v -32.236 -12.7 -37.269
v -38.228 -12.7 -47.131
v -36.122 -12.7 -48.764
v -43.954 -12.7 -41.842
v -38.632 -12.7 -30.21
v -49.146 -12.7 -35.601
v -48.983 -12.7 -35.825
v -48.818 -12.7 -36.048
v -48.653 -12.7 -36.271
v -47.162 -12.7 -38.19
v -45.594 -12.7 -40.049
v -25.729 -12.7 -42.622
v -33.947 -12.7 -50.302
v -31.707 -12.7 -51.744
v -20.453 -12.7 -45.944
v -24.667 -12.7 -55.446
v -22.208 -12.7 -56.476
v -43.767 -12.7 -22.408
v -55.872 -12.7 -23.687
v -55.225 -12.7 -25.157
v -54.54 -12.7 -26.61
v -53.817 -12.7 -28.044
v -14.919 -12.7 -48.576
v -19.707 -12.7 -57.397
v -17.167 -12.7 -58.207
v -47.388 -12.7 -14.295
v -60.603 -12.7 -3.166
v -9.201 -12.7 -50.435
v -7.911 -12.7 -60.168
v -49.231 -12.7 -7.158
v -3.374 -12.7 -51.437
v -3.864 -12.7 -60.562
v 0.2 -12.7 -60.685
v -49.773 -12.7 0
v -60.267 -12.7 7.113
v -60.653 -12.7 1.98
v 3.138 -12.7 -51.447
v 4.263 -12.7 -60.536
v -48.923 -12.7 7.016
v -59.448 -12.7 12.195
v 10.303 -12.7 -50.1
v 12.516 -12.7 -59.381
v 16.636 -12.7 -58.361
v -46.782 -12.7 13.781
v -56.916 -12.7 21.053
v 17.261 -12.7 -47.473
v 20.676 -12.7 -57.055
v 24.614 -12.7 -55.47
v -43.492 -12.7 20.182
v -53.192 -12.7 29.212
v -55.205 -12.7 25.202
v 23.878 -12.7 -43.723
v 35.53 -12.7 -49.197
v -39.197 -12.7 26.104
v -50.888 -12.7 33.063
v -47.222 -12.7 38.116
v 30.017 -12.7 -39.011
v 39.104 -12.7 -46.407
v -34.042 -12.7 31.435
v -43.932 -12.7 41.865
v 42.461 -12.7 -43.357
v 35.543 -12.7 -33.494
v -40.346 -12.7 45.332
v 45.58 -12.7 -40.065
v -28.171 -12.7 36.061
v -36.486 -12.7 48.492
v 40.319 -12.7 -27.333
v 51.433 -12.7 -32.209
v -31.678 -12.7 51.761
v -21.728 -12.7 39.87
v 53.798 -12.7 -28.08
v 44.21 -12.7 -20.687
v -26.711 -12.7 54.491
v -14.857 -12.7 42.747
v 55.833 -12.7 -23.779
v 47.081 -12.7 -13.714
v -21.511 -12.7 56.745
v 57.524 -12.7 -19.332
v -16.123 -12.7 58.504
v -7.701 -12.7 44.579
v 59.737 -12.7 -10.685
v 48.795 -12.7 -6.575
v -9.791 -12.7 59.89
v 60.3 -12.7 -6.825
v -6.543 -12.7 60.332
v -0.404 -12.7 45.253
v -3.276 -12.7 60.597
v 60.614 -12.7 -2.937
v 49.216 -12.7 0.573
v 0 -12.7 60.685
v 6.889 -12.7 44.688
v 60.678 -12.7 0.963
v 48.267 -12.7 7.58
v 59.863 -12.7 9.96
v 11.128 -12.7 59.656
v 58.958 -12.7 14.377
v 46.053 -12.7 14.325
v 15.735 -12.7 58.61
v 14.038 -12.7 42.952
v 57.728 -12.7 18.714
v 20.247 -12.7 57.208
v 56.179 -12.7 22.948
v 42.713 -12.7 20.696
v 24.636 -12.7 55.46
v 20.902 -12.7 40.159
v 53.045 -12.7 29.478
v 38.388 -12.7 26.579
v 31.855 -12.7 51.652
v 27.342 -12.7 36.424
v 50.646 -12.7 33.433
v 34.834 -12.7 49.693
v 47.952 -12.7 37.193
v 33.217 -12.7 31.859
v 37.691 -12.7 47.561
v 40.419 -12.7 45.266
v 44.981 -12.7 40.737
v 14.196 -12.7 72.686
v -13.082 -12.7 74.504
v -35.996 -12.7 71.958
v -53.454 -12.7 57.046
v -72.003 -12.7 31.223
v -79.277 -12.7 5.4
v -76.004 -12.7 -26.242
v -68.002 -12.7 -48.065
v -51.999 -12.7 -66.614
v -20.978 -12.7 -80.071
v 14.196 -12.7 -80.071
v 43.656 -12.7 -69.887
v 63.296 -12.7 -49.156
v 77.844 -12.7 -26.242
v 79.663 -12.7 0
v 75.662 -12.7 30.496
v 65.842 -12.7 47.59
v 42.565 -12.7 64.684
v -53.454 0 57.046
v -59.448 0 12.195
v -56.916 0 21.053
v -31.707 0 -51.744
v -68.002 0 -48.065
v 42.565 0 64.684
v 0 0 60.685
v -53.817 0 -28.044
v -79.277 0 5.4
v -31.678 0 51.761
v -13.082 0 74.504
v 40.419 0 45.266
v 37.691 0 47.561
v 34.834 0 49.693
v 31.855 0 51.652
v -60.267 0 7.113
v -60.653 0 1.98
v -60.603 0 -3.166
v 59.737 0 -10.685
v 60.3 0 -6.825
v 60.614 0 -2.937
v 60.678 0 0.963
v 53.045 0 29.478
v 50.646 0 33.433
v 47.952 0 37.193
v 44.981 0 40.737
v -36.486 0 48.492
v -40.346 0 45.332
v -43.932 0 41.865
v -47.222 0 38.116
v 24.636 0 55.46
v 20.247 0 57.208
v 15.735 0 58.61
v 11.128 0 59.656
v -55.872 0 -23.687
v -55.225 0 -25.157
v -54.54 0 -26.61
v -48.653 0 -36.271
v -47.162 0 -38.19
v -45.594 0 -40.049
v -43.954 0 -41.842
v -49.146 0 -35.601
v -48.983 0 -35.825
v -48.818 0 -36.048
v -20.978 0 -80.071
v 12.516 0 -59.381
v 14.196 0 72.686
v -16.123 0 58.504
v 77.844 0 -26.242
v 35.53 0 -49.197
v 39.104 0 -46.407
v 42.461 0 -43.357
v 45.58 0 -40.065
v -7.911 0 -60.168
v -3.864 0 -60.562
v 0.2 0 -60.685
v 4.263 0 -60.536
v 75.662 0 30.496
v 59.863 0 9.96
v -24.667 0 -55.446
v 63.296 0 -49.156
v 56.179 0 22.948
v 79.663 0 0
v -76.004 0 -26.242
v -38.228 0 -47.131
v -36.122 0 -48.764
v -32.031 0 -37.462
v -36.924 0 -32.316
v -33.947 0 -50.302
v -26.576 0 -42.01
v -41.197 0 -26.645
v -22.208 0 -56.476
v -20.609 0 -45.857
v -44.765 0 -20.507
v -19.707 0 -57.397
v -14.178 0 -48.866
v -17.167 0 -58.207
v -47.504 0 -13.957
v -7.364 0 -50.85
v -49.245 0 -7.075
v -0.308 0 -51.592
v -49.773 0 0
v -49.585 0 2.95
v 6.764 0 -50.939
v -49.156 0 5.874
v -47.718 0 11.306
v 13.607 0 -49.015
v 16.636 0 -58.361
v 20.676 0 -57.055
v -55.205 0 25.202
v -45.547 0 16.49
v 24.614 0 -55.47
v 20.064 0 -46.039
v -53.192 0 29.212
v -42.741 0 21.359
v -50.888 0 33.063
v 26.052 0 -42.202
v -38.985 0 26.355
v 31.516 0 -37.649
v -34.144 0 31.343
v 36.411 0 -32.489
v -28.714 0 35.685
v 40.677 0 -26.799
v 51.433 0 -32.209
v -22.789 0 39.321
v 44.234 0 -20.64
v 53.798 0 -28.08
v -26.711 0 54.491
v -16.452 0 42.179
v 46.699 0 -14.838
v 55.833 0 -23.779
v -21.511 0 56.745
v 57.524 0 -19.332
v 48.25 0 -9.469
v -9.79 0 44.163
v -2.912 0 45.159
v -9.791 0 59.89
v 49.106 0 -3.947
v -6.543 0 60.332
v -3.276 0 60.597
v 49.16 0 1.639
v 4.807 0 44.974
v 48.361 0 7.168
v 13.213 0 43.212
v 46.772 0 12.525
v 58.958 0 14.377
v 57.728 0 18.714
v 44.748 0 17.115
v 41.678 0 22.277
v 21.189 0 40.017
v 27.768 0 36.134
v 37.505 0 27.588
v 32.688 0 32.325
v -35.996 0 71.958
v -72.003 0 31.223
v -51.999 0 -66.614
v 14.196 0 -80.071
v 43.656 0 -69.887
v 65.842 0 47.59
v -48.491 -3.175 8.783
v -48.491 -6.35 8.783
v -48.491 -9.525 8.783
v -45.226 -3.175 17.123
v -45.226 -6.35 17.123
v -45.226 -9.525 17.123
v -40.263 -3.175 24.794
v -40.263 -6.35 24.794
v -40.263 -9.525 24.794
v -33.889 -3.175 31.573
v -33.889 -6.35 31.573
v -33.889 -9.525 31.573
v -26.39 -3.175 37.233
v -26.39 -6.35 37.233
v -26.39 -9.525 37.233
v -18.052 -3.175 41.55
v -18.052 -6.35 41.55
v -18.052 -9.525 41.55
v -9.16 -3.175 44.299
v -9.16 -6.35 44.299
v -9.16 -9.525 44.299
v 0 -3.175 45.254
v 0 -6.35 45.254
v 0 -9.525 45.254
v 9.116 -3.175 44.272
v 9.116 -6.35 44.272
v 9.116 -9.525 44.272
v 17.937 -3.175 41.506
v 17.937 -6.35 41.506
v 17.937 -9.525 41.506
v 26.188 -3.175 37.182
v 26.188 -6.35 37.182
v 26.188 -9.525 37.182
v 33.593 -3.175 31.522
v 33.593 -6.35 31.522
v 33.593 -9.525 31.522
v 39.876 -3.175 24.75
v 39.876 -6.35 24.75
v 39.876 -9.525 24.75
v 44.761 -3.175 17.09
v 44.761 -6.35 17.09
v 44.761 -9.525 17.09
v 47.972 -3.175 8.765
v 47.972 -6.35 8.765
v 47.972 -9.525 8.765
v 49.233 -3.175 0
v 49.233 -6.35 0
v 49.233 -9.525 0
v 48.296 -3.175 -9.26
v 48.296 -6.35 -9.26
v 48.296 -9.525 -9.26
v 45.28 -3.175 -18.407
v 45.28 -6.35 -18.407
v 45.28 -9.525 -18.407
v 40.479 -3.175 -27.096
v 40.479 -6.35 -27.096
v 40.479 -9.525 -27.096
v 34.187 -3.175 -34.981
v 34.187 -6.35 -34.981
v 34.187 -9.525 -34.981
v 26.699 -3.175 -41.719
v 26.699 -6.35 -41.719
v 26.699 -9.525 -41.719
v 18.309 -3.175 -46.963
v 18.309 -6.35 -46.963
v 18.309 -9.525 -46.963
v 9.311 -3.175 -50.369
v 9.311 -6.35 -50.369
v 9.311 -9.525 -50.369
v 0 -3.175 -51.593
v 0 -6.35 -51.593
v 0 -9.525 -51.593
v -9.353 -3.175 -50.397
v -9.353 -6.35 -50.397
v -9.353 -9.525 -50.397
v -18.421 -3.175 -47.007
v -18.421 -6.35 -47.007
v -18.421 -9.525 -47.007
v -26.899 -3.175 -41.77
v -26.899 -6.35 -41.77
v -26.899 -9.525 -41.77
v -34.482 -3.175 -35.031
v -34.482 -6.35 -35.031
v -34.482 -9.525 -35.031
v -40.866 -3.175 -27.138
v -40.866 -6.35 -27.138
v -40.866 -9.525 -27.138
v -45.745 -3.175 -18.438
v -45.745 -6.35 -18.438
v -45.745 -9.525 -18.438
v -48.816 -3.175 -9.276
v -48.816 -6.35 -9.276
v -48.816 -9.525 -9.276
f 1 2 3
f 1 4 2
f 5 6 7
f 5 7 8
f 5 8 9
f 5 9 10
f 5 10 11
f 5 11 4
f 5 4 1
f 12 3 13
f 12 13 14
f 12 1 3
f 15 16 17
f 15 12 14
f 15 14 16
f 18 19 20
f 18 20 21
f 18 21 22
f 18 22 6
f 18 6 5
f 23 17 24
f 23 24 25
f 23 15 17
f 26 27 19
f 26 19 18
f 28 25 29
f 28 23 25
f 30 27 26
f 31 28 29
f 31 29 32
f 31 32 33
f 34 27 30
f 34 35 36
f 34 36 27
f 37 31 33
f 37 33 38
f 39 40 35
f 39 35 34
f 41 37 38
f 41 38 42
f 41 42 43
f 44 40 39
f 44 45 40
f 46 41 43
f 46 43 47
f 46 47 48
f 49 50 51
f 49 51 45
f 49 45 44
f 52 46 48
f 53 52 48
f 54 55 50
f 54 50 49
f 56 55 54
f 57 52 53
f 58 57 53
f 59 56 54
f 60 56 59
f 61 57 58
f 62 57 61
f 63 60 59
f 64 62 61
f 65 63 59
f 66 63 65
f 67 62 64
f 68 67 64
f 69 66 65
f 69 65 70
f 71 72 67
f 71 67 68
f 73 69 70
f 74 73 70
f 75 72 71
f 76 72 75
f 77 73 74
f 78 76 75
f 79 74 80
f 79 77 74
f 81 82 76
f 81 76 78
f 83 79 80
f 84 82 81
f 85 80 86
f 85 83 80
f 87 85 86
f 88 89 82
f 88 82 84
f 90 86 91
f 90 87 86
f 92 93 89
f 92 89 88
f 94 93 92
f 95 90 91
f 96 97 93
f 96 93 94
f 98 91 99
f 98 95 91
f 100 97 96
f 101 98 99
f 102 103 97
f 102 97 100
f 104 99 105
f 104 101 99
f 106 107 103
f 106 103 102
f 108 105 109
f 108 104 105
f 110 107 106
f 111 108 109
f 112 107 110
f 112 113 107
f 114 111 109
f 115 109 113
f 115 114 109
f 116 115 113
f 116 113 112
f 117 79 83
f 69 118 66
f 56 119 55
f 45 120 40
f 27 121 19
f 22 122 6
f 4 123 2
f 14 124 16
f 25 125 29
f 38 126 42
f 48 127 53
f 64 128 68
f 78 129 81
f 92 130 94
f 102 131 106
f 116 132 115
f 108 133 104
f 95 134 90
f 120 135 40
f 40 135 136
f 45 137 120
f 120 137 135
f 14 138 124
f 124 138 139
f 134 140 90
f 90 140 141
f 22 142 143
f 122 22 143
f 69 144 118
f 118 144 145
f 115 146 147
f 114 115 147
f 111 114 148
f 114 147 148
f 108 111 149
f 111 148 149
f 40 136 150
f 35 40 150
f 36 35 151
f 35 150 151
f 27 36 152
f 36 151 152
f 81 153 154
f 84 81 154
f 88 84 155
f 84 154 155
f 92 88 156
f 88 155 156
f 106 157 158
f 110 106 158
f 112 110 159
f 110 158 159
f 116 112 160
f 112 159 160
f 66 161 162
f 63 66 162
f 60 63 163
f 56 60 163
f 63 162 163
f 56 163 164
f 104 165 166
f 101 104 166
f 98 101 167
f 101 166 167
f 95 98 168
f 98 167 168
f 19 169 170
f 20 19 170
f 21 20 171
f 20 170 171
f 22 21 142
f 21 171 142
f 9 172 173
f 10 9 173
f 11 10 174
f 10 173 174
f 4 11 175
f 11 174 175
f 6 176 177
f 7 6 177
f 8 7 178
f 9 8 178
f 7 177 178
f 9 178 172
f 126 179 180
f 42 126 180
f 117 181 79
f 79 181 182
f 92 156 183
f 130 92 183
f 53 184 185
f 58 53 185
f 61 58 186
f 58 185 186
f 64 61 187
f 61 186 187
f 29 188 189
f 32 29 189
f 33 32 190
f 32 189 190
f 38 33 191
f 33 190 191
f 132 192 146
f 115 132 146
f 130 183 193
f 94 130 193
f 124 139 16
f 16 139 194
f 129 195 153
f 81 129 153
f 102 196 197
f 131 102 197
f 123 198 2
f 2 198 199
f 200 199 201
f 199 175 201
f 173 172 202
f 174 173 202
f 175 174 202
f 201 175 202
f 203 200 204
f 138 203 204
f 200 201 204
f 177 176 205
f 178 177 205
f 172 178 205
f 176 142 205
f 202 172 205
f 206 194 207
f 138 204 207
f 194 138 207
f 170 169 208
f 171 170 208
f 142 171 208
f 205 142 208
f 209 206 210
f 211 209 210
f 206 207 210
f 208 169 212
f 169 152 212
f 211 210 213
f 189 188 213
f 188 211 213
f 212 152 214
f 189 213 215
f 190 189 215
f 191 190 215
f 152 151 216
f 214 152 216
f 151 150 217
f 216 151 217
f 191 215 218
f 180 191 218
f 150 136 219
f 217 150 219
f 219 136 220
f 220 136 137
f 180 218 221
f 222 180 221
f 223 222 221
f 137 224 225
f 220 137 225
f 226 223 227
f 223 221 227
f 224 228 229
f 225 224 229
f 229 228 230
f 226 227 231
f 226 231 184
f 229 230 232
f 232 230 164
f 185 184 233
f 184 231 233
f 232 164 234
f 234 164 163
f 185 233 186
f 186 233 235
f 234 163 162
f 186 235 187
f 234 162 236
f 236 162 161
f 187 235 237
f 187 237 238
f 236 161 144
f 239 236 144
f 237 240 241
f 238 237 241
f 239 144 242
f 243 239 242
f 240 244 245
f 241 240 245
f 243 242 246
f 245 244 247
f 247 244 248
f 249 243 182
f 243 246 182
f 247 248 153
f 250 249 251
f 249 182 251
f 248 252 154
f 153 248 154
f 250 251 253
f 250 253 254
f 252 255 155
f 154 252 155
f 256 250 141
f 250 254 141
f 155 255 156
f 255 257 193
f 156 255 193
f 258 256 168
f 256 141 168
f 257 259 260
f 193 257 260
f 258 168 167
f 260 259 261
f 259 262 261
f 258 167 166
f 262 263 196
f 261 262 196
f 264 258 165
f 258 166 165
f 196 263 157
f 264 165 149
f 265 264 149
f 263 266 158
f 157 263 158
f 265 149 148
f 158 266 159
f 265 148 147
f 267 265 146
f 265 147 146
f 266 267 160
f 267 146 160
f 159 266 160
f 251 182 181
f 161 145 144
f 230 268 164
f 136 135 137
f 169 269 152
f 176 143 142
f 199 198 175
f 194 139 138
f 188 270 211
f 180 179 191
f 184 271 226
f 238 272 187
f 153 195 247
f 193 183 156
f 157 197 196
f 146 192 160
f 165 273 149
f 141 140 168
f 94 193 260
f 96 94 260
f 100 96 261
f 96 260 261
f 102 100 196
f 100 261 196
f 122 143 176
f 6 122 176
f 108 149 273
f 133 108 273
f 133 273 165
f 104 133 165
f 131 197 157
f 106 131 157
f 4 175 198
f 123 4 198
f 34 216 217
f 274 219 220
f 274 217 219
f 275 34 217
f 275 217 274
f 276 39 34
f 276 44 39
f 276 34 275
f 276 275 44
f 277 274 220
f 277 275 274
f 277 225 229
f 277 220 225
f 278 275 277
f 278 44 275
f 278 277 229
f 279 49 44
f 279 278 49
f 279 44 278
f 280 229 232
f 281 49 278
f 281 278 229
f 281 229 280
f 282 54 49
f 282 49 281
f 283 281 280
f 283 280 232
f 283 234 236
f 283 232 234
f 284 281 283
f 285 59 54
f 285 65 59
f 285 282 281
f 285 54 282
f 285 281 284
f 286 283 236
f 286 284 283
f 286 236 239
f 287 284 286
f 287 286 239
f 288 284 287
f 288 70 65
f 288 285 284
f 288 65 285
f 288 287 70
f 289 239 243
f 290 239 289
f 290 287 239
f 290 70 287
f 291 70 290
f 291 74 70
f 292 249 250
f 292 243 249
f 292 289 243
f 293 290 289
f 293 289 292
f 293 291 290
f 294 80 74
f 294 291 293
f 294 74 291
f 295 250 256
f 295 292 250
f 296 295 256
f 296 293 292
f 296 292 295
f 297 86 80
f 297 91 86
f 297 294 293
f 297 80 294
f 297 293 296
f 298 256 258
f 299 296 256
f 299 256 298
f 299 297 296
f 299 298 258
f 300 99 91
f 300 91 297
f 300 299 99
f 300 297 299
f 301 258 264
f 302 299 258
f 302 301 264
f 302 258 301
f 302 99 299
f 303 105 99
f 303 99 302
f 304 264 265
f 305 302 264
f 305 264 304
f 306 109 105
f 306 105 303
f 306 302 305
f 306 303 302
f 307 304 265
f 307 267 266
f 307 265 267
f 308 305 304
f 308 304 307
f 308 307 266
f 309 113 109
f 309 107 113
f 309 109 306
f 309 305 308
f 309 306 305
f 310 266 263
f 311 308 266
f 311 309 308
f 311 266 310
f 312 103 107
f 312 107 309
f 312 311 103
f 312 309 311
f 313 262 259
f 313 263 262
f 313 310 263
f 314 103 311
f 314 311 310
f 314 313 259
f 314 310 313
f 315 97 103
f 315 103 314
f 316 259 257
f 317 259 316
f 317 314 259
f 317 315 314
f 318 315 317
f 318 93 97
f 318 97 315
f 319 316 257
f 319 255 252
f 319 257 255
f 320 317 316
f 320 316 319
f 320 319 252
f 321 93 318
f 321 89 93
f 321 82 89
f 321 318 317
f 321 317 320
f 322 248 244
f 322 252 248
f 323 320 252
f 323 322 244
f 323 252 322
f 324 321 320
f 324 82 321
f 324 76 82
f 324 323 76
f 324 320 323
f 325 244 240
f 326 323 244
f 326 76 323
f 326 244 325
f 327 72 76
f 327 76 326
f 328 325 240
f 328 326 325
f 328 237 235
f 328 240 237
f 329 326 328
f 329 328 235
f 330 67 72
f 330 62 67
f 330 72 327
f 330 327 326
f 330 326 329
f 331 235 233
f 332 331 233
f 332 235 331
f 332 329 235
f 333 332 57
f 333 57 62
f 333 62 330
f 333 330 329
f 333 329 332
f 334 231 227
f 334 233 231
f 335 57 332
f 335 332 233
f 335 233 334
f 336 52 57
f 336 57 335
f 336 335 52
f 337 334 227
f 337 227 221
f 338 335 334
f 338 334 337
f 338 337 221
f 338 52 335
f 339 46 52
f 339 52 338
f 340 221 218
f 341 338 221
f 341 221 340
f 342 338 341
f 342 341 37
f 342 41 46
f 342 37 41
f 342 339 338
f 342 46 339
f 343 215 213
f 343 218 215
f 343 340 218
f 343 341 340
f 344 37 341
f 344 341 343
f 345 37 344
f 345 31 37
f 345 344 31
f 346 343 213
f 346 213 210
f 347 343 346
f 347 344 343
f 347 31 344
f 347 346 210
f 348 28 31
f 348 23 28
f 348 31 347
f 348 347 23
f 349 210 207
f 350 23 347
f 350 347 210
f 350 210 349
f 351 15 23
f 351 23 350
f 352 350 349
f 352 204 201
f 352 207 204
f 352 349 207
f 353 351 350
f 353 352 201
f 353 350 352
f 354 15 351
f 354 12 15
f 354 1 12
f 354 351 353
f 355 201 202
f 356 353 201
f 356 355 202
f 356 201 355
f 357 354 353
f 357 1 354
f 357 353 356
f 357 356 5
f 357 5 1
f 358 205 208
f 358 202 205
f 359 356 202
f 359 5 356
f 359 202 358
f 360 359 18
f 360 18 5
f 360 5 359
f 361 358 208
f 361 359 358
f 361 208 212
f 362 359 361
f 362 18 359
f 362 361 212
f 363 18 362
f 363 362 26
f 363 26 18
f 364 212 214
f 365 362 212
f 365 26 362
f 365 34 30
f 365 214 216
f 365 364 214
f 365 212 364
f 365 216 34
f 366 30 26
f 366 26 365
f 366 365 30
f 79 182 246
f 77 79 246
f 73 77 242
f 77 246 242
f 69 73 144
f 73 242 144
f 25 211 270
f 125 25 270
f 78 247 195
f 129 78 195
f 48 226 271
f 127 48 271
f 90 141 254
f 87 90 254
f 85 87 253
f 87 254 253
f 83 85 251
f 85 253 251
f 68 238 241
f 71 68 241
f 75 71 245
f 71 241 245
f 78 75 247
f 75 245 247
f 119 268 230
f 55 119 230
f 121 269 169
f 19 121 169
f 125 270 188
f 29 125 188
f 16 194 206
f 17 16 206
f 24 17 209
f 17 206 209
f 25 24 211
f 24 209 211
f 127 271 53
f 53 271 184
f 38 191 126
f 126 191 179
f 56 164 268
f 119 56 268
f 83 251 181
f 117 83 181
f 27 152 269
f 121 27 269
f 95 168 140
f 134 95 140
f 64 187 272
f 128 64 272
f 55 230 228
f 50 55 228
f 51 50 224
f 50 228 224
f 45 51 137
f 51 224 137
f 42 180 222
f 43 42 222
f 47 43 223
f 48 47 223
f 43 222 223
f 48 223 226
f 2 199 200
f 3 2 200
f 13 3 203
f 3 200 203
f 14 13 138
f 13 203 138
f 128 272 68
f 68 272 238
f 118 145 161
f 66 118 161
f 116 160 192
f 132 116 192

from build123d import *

# Parameters (mm, degrees)
F1_DEPTH = 12.7
F3_DEPTH = 25.4


with BuildPart() as f1:
    # F0 (on Front) → F1 (new body)
    with BuildSketch(Plane.XZ):
        with BuildLine():
            Line((14.1956806183, 72.685867548), (-16.1233143312, 58.504369939))
            ThreePointArc((-16.1233143312, 58.504369939), (-24.1372805025, 55.6786696763), (-31.677979842, 51.7612611913))
            Line((-31.677979842, 51.7612611913), (-13.0823301151, 74.5044052601))
            Line((-13.0823301151, 74.5044052601), (-36.4863287749, 48.4919620093))
            ThreePointArc((-36.4863287749, 48.4919620093), (-42.174569089, 43.635172615), (-47.2221327461, 38.1155184392))
            Line((-47.2221327461, 38.1155184392), (-35.9958522022, 71.9584524632))
            Line((-35.9958522022, 71.9584524632), (-50.8878393335, 33.0628246669))
            ThreePointArc((-50.8878393335, 33.0628246669), (-54.2355910398, 27.2254151767), (-56.9164614127, 21.0532417275))
            Line((-56.9164614127, 21.0532417275), (-53.4537769854, 57.0464842021))
            Line((-53.4537769854, 57.0464842021), (-59.4475901172, 12.1945314072))
            ThreePointArc((-59.4475901172, 12.1945314072), (-60.5145613182, 4.5508719434), (-60.6027765322, -3.1663928323))
            Line((-60.6027765322, -3.1663928323), (-72.0028206706, 31.2233008444))
            Line((-72.0028206706, 31.2233008444), (-55.871643126, -23.6871708184))
            ThreePointArc((-55.871643126, -23.6871708184), (-54.8874650861, -25.8860723827), (-53.8167873263, -28.0441788764))
            Line((-53.8167873263, -28.0441788764), (-79.2769566178, 5.400122609))
            Line((-79.2769566178, 5.400122609), (-49.1459707846, -35.6005073365))
            Line((-49.1459707846, -35.6005073365), (-48.6531234879, -36.2711475122))
            ThreePointArc((-48.6531234879, -36.2711475122), (-46.3871917294, -39.1273690714), (-43.9538296695, -41.8423639912))
            Line((-43.9538296695, -41.8423639912), (-76.0035961866, -26.242364198))
            Line((-76.0035961866, -26.242364198), (-38.2276596565, -47.1313972227))
            ThreePointArc((-38.2276596565, -47.1313972227), (-35.04313087, -49.5449447049), (-31.7066726719, -51.7436901956))
            Line((-31.7066726719, -51.7436901956), (-68.0020451546, -48.0647683144))
            Line((-68.0020451546, -48.0647683144), (-24.6669585423, -55.4460433508))
            ThreePointArc((-24.6669585423, -55.4460433508), (-20.9626144697, -56.9499022087), (-17.1672884351, -58.2065870394))
            Line((-17.1672884351, -58.2065870394), (-51.998950541, -66.6138157248))
            Line((-51.998950541, -66.6138157248), (-7.91081853, -60.1676118619))
            ThreePointArc((-7.91081853, -60.1676118619), (-1.8331594251, -60.657745536), (4.2630059653, -60.5355213666))
            Line((4.2630059653, -60.5355213666), (-20.9776671322, -80.070964992))
            Line((-20.9776671322, -80.070964992), (12.5156716461, -59.380809444))
            ThreePointArc((12.5156716461, -59.380809444), (18.6675310426, -57.7429290195), (24.6139559608, -55.4695929221))
            Line((24.6139559608, -55.4695929221), (14.1956806183, -80.070964992))
            Line((14.1956806183, -80.070964992), (35.5296064347, -49.197252297))
            ThreePointArc((35.5296064347, -49.197252297), (40.8111137132, -44.9129776843), (45.5800962078, -40.0646651885))
            Line((45.5800962078, -40.0646651885), (43.6559207737, -69.8871687055))
            Line((43.6559207737, -69.8871687055), (51.4325498421, -32.2089332907))
            ThreePointArc((51.4325498421, -32.2089332907), (54.8573982061, -25.9497288819), (57.5239385722, -19.3318146619))
            Line((57.5239385722, -19.3318146619), (63.2960870862, -49.1558872163))
            Line((63.2960870862, -49.1558872163), (59.737413085, -10.6847575962))
            ThreePointArc((59.737413085, -10.6847575962), (60.4886248495, -4.8835264714), (60.6777969485, 0.9630807153))
            Line((60.6777969485, 0.9630807153), (77.8443515301, -26.242364198))
            Line((77.8443515301, -26.242364198), (59.8625595644, 9.9597454474))
            ThreePointArc((59.8625595644, 9.9597454474), (58.3831894637, 16.5567434911), (56.1791835984, 22.9482438805))
            Line((56.1791835984, 22.9482438805), (79.6628892422, 0))
            Line((79.6628892422, 0), (53.0447443432, 29.4784271043))
            ThreePointArc((53.0447443432, 29.4784271043), (49.3348326812, 35.338319871), (44.9805353483, 40.7366420653))
            Line((44.9805353483, 40.7366420653), (75.6621137261, 30.4958876222))
            Line((75.6621137261, 30.4958876222), (40.4193028999, 45.2659090273))
            ThreePointArc((40.4193028999, 45.2659090273), (36.2781471273, 48.6479044563), (31.8553829244, 51.6522714478))
            Line((31.8553829244, 51.6522714478), (65.8420324326, 47.5901030004))
            Line((65.8420324326, 47.5901030004), (24.6360375773, 55.4597892123))
            ThreePointArc((24.6360375773, 55.4597892123), (18.0049262379, 57.952956768), (11.1284468002, 59.6563512025))
            Line((11.1284468002, 59.6563512025), (42.5648018718, 64.6843239665))
            Line((42.5648018718, 64.6843239665), (0, 60.6854394973))
            ThreePointArc((0, 60.6854394973), (-4.9116588, 60.4863470117), (-9.7910899563, 59.8903758917))
            Line((-9.7910899563, 59.8903758917), (14.1956806183, 72.685867548))
        make_face()
        with BuildLine():
            Line((-48.6531234879, -36.2711475122), (-49.1459707846, -35.6005073365))
            ThreePointArc((-49.1459707846, -35.6005073365), (-48.9006968222, -35.936672318), (-48.6531234879, -36.2711475122))
        make_face()
    extrude(amount=F1_DEPTH)

    # F2 (on face) → F3 (cut)
    with BuildSketch(Plane.XZ.offset(12.7)):
        with BuildLine():
            add(Edge.make_bspline(
                [(-49.7726202011, 0), (-49.2526152751, 23.8113209552), (0.1236425889, 66.7216871145), (73.7668389709, 1.6139944031), (0.1396115913, -78.6254844393), (-50.3094277913, -24.5807244903), (-49.7726202011, 0)],
                knots=[0, 0, 0, 0, 0.2463679437, 0.4920058414, 0.7456712898, 1, 1, 1, 1], degree=3))
        make_face()
    extrude(amount=-F3_DEPTH, mode=Mode.SUBTRACT)


solid = f1.part
